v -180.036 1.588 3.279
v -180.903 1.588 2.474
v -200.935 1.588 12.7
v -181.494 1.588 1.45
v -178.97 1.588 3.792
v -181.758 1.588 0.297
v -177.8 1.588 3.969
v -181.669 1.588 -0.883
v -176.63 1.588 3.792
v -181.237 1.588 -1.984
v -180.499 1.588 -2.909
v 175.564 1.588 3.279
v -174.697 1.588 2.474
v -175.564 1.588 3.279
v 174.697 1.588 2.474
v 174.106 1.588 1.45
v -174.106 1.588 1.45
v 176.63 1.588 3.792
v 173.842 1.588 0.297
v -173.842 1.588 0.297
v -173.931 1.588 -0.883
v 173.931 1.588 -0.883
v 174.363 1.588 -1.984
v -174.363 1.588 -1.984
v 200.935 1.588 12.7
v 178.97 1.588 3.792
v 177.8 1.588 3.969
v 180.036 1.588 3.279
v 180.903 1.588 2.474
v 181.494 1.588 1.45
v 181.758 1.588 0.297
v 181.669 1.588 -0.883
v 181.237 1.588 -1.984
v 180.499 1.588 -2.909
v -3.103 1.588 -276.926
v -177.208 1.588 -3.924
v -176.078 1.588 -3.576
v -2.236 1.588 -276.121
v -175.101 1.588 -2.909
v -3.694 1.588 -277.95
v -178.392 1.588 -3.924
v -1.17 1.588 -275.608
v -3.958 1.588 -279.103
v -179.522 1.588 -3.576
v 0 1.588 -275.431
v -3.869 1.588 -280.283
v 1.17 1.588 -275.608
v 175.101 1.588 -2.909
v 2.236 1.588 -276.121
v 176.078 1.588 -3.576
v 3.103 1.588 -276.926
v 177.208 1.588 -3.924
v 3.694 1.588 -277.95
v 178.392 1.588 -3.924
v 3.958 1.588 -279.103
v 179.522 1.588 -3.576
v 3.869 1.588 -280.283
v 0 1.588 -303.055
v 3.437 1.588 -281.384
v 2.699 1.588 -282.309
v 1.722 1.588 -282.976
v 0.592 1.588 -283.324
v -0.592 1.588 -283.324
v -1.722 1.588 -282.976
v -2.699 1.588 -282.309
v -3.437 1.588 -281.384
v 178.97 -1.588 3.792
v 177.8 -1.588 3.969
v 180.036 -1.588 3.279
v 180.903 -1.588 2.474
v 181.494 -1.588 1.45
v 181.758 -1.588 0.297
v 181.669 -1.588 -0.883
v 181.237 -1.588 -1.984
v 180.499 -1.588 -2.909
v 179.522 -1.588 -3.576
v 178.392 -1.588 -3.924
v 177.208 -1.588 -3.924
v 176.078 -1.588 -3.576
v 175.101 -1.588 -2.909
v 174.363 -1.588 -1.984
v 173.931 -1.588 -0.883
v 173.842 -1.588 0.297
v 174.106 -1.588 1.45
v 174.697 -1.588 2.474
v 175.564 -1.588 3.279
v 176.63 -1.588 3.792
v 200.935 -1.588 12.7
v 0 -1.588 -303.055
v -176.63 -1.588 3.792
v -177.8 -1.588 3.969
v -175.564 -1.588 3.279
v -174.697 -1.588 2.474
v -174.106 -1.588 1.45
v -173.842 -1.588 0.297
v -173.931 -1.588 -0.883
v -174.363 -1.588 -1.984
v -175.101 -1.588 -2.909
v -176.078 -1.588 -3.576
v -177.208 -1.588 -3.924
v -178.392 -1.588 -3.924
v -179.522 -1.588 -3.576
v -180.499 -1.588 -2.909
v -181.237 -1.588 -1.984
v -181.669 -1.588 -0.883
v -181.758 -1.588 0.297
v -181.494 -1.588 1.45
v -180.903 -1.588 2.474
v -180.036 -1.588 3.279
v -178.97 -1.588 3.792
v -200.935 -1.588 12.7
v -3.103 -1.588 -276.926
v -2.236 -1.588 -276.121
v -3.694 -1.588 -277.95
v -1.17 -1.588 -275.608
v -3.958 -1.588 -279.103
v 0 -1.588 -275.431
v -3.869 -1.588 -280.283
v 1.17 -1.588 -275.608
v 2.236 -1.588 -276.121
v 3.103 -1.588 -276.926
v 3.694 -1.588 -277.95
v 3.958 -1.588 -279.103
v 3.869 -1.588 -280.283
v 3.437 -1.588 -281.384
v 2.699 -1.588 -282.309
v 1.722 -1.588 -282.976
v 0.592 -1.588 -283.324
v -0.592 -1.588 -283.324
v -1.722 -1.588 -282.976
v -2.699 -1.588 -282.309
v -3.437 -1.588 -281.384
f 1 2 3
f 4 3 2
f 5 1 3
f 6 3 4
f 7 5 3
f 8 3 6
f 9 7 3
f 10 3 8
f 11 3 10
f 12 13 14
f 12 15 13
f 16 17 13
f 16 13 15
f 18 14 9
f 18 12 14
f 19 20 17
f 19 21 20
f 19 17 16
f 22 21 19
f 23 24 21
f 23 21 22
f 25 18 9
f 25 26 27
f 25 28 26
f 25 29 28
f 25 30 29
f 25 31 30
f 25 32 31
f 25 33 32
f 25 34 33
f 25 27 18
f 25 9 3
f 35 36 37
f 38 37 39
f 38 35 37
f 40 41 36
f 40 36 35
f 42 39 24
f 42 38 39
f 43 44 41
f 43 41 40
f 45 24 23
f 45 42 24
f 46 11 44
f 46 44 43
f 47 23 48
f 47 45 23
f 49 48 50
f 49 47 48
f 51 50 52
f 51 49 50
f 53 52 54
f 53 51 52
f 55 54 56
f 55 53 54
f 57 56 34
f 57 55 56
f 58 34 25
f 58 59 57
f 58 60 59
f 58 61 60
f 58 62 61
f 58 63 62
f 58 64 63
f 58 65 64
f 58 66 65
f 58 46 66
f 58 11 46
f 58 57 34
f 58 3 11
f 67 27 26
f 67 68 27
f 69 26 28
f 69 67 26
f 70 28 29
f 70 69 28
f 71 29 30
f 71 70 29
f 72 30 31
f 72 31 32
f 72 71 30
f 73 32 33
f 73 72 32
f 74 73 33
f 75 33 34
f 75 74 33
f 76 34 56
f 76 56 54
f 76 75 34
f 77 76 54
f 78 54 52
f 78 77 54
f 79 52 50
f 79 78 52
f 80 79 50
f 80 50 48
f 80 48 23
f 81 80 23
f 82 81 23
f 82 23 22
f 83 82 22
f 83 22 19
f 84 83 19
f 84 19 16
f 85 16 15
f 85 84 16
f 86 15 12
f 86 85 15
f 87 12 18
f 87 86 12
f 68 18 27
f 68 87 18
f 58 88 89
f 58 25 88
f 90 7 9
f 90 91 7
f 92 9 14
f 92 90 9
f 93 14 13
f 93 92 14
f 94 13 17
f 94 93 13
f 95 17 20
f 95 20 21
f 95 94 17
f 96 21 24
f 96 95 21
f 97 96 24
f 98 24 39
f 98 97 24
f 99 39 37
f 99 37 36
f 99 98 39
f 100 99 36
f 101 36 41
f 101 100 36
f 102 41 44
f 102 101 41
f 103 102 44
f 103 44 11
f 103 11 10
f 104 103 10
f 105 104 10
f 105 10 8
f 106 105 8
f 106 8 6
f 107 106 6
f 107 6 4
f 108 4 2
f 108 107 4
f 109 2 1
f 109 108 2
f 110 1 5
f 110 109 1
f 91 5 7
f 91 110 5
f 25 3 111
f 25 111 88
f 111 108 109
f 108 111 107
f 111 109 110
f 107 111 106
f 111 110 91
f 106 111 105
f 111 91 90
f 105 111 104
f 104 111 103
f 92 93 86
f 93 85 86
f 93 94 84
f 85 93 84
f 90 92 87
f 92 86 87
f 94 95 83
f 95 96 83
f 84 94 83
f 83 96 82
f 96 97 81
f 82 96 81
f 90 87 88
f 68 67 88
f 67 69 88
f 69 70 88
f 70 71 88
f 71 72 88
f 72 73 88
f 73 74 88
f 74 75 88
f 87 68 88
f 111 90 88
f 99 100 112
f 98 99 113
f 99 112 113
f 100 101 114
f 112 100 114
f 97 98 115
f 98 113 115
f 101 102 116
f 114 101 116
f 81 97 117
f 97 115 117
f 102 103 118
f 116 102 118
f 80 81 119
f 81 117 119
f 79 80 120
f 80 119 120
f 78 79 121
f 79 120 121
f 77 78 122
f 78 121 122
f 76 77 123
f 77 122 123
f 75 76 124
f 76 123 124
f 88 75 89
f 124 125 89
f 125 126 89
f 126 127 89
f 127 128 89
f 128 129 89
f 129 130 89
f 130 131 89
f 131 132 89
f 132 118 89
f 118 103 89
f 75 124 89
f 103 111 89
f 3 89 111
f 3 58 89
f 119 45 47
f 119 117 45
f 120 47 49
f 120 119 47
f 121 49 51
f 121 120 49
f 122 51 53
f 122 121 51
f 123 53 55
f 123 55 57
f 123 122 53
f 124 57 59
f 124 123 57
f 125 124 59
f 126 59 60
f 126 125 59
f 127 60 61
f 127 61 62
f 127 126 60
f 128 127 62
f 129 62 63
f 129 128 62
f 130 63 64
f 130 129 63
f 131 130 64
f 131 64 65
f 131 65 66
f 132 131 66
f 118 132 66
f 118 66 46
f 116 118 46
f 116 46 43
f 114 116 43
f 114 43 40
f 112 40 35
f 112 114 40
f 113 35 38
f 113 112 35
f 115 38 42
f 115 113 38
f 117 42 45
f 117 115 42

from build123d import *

# Parameters (mm, degrees)
SKETCH1_R           = 3.96875
BOSS_EXTRUDE1_DEPTH = 1.5875


with BuildPart() as part:
    # Sketch1 → Boss-Extrude1 (new, symmetric)
    with BuildSketch(Plane(origin=(0, 0, 0), x_dir=(1, 0, 0), z_dir=(0, 1, 0))):
        Polygon((0, 303.055391585), (-200.93524919, -12.7), (200.93524919, -12.7), align=None)
        with Locations(Location((-177.8, 0, 0), (0, 0, 270))):
            Circle(SKETCH1_R, mode=Mode.SUBTRACT)
        with Locations(Location((0, 279.4, 0), (0, 0, 270))):
            Circle(SKETCH1_R, mode=Mode.SUBTRACT)
        with Locations(Location((177.8, 0, 0), (0, 0, 270))):
            Circle(SKETCH1_R, mode=Mode.SUBTRACT)
    extrude(amount=BOSS_EXTRUDE1_DEPTH, both=True)


solid = part.part
